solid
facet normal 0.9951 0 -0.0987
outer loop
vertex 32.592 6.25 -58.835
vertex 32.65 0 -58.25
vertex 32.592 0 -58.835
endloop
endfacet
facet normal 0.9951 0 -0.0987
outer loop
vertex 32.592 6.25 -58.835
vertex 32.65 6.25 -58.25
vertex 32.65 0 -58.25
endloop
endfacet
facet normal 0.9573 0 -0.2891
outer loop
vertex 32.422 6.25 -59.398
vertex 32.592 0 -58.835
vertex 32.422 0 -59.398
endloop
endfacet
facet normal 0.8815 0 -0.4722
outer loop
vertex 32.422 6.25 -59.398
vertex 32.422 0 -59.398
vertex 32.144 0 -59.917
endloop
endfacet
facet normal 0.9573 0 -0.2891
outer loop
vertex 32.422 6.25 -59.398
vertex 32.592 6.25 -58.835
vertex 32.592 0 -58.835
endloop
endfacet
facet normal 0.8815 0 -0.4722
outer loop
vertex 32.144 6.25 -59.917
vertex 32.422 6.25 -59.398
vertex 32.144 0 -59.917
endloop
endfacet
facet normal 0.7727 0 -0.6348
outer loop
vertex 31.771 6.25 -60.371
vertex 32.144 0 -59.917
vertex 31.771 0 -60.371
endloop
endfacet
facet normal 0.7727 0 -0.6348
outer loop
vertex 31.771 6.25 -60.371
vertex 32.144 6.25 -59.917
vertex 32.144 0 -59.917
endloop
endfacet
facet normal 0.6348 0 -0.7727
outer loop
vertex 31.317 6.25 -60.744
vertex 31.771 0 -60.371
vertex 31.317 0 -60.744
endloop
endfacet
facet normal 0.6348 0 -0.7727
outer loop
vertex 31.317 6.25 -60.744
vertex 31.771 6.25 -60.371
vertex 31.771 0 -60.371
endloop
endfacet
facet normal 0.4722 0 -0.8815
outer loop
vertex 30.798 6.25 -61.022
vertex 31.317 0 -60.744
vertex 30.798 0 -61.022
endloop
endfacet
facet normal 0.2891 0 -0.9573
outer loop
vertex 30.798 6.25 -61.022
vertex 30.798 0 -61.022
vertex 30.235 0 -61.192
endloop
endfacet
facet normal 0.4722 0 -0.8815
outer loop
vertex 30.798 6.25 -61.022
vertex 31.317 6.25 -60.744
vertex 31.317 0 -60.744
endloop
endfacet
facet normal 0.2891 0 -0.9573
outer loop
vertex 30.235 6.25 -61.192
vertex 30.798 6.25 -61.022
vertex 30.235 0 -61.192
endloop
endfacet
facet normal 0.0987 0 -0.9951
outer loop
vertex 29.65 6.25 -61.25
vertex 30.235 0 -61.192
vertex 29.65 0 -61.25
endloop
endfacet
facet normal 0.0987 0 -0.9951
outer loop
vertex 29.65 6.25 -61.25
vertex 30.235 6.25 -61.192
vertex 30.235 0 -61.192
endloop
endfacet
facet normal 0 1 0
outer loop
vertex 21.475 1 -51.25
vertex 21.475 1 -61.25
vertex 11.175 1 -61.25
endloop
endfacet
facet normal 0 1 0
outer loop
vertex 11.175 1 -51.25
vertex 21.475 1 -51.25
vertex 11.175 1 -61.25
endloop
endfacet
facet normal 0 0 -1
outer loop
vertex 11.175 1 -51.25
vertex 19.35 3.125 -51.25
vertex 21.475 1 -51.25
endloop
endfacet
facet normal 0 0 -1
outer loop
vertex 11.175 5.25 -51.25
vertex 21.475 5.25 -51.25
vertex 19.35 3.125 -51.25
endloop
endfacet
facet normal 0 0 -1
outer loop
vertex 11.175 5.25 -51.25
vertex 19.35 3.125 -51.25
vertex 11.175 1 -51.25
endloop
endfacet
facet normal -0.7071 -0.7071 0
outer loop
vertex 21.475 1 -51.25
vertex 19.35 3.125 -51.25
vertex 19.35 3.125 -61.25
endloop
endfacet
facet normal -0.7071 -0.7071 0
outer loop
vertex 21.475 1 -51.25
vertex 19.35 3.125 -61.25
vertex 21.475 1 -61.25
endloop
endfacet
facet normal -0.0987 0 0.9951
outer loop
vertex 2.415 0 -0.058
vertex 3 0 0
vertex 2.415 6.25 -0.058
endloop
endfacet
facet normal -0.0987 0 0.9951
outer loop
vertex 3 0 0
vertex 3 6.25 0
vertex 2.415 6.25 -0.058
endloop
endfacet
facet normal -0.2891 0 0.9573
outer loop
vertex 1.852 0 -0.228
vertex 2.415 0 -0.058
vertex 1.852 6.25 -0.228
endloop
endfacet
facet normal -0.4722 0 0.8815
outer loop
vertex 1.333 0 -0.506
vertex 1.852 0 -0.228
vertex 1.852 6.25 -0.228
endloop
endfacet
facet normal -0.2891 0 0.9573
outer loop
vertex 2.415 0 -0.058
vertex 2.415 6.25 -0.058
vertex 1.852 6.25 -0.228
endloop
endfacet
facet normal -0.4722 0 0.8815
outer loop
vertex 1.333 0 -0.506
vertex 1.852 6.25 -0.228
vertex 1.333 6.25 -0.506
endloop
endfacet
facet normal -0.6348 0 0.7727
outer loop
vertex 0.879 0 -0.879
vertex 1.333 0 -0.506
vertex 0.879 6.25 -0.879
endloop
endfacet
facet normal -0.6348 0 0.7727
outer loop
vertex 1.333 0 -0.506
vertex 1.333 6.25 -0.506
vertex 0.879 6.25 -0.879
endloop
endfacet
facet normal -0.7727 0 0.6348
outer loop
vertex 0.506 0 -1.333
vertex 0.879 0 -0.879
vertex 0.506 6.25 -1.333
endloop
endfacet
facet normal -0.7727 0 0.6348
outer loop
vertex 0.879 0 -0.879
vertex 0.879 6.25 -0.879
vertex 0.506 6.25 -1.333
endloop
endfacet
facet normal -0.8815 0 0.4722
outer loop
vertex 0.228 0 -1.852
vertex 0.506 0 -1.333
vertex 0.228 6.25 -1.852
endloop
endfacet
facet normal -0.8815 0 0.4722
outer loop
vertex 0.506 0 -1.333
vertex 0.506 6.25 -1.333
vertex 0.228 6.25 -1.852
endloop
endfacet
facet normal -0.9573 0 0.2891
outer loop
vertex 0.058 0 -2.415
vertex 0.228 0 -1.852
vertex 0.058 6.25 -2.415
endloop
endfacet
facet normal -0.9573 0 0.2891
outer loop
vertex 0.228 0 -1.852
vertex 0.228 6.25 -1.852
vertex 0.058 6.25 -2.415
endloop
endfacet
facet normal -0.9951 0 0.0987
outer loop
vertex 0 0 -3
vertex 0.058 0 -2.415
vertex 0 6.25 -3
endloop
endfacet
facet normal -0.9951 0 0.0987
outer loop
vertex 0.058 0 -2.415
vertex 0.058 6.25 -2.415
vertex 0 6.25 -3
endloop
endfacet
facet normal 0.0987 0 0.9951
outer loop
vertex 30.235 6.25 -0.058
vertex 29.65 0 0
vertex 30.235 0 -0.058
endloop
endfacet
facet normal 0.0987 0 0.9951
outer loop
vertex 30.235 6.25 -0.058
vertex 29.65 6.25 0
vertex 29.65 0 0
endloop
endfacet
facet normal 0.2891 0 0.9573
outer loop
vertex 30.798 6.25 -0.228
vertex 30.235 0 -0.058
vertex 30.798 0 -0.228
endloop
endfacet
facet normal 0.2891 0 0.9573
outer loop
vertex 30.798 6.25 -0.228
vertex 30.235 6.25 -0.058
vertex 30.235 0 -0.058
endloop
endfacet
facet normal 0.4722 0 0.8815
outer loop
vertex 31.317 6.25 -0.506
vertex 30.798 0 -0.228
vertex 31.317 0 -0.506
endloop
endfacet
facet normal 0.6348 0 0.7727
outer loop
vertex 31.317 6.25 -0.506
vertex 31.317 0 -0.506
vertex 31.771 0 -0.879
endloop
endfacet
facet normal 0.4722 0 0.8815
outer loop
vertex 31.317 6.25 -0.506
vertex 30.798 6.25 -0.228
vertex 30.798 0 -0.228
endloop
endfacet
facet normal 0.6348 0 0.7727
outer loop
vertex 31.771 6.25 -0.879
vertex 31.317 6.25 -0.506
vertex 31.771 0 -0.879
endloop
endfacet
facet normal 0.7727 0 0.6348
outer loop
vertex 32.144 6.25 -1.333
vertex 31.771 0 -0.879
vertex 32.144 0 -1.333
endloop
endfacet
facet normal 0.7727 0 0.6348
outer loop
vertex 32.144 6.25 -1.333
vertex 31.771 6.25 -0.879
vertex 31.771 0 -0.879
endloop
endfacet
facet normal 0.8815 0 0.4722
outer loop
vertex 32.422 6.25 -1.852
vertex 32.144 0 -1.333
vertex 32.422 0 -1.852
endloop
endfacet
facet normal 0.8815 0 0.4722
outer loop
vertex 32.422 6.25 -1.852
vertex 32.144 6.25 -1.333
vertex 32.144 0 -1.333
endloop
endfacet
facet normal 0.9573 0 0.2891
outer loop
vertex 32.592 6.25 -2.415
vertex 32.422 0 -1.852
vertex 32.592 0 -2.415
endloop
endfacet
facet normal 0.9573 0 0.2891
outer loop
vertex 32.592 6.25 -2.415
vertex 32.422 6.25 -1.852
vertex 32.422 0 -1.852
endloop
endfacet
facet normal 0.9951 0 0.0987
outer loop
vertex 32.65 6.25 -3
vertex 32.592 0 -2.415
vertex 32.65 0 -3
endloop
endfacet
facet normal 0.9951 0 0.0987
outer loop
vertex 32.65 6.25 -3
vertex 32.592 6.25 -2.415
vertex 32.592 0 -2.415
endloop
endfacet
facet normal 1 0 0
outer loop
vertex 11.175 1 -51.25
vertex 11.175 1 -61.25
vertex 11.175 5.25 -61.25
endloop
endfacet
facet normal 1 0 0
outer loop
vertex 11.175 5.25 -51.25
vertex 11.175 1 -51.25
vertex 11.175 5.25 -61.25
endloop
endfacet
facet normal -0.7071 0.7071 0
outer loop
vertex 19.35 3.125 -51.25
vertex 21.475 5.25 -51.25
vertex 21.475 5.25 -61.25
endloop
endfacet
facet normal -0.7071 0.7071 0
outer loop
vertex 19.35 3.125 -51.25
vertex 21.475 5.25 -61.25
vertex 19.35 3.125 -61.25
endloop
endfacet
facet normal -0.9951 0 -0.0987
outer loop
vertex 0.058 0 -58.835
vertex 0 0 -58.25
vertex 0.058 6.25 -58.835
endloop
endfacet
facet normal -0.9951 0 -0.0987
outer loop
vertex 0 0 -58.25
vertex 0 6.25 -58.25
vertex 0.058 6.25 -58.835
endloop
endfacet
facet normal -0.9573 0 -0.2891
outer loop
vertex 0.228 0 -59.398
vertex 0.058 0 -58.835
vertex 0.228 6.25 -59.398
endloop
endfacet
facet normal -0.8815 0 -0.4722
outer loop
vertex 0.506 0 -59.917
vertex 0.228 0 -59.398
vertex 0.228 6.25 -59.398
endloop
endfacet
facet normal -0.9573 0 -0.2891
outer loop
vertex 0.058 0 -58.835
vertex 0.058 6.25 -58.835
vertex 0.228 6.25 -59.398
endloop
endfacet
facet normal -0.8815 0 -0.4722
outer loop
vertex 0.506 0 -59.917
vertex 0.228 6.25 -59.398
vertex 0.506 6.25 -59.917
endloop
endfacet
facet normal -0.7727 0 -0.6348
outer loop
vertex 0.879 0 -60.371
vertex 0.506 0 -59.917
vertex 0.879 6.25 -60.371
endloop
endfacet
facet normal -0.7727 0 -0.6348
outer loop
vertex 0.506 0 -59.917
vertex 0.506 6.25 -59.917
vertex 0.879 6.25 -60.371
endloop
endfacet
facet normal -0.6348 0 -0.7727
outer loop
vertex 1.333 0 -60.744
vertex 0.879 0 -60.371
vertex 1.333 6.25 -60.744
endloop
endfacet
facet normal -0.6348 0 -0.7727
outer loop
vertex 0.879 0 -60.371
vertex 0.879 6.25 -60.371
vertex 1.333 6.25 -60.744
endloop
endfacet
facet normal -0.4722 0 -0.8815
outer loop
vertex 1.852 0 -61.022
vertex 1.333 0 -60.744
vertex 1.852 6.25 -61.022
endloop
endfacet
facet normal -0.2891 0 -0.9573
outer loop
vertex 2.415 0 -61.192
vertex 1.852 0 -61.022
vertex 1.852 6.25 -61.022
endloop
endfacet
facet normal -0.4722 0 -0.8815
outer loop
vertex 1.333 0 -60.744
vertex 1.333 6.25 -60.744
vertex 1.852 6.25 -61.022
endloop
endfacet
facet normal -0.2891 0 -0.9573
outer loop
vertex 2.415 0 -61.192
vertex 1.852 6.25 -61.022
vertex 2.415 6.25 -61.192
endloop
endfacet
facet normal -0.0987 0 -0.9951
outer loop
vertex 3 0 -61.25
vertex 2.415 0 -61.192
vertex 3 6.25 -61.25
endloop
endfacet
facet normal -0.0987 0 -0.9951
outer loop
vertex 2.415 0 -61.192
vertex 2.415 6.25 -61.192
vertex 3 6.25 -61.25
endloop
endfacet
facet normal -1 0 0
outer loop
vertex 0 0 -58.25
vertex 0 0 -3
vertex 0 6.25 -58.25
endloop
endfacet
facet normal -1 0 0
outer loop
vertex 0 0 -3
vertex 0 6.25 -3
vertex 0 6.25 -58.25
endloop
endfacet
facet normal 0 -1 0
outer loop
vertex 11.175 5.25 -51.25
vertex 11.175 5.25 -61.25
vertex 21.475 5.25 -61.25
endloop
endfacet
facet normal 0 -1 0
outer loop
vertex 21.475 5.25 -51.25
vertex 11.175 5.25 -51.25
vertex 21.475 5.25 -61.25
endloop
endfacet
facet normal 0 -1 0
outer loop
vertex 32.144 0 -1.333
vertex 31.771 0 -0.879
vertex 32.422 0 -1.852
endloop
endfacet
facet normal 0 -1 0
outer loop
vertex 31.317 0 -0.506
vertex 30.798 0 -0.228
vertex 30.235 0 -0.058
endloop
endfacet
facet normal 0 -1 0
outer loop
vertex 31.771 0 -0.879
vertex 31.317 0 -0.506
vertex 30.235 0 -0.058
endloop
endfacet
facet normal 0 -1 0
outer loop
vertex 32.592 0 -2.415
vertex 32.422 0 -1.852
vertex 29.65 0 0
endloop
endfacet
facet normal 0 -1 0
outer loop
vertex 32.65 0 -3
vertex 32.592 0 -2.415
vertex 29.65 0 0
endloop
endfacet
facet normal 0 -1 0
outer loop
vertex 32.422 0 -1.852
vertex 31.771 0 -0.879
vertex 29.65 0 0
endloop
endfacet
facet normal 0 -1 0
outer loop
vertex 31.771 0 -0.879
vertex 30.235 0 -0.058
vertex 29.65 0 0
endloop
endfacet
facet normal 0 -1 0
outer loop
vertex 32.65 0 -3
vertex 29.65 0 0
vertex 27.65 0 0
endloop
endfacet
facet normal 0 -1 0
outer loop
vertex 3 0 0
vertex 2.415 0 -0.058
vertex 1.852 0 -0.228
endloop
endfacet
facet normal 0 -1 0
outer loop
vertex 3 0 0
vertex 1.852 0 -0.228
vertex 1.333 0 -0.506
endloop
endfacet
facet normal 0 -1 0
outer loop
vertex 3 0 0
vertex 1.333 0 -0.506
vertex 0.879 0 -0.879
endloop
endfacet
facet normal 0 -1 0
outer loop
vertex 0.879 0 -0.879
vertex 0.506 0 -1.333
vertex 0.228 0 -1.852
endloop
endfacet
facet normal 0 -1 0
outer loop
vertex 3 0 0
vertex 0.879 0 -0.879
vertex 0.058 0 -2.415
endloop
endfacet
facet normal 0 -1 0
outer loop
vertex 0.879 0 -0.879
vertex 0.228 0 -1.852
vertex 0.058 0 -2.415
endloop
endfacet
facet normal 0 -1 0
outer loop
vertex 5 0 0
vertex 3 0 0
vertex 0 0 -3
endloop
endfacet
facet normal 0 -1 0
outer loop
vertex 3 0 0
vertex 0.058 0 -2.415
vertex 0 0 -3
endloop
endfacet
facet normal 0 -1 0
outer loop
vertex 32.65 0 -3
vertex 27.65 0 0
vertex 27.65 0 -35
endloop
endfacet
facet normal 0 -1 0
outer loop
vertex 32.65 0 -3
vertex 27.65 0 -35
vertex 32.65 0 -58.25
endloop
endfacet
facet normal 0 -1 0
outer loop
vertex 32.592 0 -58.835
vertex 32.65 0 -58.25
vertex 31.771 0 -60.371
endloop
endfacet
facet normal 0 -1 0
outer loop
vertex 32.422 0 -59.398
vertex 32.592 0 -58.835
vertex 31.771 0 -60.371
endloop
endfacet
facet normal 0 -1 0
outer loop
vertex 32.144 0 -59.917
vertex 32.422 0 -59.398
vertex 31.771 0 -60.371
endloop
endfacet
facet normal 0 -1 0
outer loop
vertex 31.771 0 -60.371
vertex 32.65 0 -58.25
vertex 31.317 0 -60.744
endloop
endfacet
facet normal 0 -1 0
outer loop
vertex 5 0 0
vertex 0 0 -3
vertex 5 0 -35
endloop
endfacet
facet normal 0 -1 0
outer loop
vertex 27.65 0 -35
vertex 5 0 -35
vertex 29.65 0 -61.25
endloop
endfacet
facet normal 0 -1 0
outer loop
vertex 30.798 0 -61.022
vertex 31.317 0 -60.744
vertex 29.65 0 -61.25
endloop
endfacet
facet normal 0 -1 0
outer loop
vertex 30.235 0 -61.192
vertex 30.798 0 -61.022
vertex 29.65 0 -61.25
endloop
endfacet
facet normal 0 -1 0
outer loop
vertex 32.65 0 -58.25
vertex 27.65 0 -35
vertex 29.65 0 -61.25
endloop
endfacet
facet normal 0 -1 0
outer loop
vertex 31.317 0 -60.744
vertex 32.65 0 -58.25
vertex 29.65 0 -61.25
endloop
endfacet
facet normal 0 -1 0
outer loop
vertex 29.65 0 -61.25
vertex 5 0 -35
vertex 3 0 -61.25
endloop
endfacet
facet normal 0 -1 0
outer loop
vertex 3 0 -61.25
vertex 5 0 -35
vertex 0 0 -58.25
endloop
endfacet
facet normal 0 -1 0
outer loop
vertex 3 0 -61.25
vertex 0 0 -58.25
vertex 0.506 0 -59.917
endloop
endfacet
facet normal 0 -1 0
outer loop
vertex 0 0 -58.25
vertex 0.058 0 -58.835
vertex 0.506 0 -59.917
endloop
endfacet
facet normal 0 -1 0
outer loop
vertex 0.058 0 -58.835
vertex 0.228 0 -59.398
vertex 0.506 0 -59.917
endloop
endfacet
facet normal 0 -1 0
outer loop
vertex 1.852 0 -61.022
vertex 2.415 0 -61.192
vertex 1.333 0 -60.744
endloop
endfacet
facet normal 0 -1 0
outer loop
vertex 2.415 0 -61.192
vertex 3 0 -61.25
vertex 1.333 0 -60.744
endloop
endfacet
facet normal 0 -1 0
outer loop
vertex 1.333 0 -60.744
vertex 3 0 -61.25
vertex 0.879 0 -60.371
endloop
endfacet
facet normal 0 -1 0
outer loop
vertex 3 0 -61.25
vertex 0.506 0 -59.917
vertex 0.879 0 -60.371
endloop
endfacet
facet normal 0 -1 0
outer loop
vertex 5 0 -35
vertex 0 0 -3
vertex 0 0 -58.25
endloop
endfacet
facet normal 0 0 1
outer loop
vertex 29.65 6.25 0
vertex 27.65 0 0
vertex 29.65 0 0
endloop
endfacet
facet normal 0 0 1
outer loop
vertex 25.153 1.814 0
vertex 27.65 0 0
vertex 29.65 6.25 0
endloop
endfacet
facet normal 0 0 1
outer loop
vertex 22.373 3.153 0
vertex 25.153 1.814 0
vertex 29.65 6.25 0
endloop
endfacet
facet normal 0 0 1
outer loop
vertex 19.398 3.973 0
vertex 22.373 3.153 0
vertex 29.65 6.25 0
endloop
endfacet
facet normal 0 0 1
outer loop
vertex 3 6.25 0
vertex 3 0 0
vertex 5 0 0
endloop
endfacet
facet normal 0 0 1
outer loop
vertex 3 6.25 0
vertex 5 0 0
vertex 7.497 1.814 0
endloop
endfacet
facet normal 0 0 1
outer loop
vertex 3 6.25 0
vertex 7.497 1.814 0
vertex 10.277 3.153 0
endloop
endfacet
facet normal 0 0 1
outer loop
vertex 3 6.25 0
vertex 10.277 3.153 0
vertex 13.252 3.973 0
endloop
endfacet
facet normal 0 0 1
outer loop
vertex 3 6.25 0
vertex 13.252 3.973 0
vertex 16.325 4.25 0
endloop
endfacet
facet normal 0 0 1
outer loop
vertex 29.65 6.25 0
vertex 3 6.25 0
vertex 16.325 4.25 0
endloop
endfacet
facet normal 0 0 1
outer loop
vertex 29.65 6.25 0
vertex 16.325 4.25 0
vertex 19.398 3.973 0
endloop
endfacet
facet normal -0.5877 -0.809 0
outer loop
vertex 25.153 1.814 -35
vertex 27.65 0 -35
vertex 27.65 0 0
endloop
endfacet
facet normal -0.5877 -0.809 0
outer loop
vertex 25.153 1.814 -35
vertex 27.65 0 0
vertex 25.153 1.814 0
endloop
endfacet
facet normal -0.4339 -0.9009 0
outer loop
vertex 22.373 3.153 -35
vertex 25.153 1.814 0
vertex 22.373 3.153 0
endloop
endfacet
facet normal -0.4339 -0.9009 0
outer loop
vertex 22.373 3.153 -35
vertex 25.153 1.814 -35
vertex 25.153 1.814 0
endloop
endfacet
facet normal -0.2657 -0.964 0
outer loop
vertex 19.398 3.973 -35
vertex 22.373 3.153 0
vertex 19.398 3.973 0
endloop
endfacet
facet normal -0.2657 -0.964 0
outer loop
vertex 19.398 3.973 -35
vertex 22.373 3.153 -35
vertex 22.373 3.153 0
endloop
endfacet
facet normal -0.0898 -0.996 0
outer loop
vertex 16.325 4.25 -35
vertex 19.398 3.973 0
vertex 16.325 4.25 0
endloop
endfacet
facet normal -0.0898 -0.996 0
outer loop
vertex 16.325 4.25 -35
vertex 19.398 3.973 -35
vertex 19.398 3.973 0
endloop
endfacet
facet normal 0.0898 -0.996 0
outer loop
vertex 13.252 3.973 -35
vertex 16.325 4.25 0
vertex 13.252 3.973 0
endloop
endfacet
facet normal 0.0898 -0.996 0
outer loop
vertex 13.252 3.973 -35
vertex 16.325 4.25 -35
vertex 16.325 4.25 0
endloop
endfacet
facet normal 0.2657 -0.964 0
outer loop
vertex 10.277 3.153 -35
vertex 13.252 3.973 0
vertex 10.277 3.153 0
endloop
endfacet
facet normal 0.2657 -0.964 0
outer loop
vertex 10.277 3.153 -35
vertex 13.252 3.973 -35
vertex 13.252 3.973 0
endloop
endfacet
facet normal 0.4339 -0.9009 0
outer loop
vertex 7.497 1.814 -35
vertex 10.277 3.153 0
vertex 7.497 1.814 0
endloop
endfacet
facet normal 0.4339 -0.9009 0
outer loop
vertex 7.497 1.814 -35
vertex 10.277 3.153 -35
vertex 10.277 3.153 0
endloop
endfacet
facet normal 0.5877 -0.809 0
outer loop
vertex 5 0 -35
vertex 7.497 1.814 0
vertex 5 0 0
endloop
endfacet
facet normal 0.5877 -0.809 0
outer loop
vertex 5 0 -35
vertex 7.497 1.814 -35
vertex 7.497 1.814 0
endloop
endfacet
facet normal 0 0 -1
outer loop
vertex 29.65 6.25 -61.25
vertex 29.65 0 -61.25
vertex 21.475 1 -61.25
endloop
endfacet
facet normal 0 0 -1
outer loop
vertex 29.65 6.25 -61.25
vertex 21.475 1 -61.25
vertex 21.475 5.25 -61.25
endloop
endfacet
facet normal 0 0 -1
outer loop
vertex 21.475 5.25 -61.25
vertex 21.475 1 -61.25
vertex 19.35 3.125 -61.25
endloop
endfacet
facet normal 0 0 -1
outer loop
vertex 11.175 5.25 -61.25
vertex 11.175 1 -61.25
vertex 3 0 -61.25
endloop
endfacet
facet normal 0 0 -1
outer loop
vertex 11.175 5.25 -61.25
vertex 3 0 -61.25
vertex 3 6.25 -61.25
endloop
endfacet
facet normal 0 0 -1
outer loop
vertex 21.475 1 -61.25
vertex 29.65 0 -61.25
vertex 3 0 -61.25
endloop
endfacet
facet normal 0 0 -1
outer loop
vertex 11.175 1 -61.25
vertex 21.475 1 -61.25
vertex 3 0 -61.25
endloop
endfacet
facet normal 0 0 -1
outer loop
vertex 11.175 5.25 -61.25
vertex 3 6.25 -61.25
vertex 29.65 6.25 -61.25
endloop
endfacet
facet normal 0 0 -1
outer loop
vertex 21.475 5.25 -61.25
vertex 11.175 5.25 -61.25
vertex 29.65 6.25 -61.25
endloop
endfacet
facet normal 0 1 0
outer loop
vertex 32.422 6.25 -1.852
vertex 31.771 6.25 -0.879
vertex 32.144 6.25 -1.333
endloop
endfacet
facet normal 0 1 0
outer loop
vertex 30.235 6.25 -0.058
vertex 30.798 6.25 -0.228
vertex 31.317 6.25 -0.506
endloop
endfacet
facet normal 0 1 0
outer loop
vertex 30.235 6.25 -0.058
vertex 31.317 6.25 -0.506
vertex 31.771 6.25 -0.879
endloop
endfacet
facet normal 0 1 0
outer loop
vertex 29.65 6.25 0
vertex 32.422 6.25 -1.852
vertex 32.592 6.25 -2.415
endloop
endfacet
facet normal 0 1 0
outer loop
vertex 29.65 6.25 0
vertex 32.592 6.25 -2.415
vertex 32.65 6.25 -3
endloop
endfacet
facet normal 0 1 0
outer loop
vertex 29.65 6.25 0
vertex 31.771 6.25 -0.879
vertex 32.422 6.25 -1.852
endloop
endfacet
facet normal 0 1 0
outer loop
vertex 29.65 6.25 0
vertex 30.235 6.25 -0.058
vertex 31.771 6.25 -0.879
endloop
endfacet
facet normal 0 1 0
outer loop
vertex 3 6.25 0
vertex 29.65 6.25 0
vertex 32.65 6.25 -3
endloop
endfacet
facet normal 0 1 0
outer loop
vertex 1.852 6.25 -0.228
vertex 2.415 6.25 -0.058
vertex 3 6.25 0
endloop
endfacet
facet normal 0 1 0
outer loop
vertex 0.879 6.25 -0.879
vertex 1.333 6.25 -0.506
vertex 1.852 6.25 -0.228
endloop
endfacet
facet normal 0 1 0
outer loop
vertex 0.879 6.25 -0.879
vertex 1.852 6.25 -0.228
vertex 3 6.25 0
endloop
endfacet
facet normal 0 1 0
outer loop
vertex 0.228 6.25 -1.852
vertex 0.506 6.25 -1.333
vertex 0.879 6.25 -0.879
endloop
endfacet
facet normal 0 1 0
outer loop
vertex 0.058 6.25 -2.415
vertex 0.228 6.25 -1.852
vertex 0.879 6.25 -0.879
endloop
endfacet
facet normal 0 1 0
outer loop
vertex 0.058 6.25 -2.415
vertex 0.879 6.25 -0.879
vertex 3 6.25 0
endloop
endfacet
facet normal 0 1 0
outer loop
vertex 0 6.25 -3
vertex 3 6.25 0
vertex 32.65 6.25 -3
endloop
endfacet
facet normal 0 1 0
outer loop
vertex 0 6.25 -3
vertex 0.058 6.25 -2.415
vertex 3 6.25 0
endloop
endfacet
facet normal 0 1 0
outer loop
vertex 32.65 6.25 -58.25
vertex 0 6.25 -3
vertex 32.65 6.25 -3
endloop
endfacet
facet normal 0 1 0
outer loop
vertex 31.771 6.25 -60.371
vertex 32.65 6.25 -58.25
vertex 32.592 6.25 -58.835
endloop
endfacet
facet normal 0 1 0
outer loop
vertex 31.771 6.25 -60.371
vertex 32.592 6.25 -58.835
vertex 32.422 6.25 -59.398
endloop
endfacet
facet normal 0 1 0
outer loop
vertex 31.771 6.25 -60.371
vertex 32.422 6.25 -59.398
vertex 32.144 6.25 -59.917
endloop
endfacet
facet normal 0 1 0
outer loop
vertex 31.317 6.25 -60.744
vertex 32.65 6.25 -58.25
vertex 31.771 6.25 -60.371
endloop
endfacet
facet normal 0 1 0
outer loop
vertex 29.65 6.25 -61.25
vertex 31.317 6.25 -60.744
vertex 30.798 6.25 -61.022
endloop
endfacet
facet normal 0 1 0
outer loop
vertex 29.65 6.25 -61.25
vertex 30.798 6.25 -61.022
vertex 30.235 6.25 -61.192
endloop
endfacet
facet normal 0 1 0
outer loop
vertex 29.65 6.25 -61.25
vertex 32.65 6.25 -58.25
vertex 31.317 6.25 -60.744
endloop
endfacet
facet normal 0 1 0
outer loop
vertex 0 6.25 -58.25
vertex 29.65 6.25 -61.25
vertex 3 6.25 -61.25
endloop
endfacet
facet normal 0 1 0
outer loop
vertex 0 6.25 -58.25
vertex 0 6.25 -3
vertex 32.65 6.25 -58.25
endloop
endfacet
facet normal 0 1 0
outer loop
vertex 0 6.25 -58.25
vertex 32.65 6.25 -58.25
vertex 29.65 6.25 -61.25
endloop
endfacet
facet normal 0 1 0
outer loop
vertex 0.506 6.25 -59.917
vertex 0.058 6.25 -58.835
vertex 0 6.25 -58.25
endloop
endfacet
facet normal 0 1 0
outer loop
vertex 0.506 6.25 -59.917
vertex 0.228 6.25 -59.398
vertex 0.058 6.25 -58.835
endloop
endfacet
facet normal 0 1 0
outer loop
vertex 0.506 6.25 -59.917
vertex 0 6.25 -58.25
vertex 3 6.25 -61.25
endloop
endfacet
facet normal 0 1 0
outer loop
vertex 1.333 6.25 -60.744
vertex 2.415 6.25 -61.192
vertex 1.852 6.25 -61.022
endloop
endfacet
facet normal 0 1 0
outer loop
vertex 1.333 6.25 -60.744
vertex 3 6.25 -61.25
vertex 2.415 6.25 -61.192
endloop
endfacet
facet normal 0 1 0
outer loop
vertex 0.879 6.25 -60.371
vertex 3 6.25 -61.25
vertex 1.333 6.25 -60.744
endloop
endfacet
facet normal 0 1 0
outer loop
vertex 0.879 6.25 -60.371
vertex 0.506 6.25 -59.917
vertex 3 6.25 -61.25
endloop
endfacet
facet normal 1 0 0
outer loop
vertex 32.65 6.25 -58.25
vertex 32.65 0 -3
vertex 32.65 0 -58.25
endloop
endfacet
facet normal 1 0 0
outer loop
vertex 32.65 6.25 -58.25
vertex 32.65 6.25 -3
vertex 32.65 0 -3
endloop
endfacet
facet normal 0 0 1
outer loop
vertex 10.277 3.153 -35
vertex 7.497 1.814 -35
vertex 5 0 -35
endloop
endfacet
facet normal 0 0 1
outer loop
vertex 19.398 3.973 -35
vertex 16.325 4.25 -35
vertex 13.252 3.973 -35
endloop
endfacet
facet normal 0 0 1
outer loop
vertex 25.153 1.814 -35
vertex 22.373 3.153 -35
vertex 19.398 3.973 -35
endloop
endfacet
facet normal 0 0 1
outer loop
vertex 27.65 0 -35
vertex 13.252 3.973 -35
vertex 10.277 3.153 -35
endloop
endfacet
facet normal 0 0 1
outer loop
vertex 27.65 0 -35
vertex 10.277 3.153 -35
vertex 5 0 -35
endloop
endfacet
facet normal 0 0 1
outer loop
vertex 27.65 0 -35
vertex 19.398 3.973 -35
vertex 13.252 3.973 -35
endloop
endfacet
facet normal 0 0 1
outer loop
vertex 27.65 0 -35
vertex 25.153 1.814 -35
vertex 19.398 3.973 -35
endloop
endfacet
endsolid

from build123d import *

# Parameters (mm, degrees)
SKETCH1_W               = 61.25
SKETCH1_H               = 6.25
BOSS_EXTRUDE1_DEPTH     = 32.65
CUT_EXTRUDE1_DEPTH      = 70.689651312
CUT_EXTRUDE1_DEPTH_BACK = 35
CUT_EXTRUDE2_DEPTH      = 10
FILLET1_R               = 3


with BuildPart() as part:
    # Sketch1 → Boss-Extrude1 (new body)
    with BuildSketch(Plane(origin=(0, 0, 0), x_dir=(0, 0, -1), z_dir=(1, 0, 0))):
        with Locations((30.625, 3.125)):
            Rectangle(SKETCH1_W, SKETCH1_H)
    extrude(amount=BOSS_EXTRUDE1_DEPTH)

    # Sketch2 → Cut-Extrude1 (cut, two sides: drawn at the far end of the back side and taken through both)
    with BuildSketch(Plane.XY.offset(-CUT_EXTRUDE1_DEPTH_BACK)):
        with BuildLine():
            Line((5, 0), (27.65, 0))
            ThreePointArc((27.65, 0), (16.325, 4.25), (5, 0))
        make_face()
    extrude(amount=CUT_EXTRUDE1_DEPTH + CUT_EXTRUDE1_DEPTH_BACK, mode=Mode.SUBTRACT)

    # Sketch3 → Cut-Extrude2 (cut)
    with BuildSketch(Plane(origin=(0, 0, -61.25), x_dir=(-1, 0, 0), z_dir=(0, 0, -1))):
        Polygon((-11.175, 1), (-11.175, 5.25), (-21.475, 5.25), (-19.35, 3.125), (-21.475, 1), align=None)
    extrude(amount=-CUT_EXTRUDE2_DEPTH, mode=Mode.SUBTRACT)

    # Fillet1
    fillet1_edges = [part.edges().sort_by_distance(p)[0] for p in [
        (32.65, 3.125, 0),
        (0, 3.125, 0),
        (0, 3.125, -61.25),
        (32.65, 3.125, -61.25),
    ]]
    fillet(fillet1_edges, radius=FILLET1_R)


solid = part.part
